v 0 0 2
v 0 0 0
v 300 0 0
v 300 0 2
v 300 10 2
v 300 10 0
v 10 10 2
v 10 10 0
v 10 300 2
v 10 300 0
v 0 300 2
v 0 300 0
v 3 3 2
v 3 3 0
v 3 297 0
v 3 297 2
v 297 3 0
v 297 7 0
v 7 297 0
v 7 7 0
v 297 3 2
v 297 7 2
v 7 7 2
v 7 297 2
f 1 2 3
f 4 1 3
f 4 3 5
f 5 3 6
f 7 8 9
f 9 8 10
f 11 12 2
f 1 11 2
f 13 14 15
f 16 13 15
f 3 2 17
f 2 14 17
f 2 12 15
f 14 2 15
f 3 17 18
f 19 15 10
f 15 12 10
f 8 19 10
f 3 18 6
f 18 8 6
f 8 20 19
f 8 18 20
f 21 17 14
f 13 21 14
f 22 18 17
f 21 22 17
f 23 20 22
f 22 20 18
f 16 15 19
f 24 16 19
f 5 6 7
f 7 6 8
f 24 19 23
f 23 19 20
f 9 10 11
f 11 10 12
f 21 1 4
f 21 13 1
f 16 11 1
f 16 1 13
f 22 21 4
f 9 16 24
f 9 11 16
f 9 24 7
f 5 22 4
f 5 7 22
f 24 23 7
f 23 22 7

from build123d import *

# Parameters (mm, degrees)
F1_DEPTH = 2


with BuildPart() as f1:
    # F0 (on Top) → F1 (new body)
    with BuildSketch(Plane.XY):
        Polygon((0, 10), (0, 0), (10, 0), (300, 0), (300, 10), (10, 10), (10, 300), (0, 300), align=None)
        Polygon((7, 297), (7, 7), (297, 7), (297, 3), (3, 3), (3, 297), align=None, mode=Mode.SUBTRACT)
    extrude(amount=F1_DEPTH)


solid = f1.part
